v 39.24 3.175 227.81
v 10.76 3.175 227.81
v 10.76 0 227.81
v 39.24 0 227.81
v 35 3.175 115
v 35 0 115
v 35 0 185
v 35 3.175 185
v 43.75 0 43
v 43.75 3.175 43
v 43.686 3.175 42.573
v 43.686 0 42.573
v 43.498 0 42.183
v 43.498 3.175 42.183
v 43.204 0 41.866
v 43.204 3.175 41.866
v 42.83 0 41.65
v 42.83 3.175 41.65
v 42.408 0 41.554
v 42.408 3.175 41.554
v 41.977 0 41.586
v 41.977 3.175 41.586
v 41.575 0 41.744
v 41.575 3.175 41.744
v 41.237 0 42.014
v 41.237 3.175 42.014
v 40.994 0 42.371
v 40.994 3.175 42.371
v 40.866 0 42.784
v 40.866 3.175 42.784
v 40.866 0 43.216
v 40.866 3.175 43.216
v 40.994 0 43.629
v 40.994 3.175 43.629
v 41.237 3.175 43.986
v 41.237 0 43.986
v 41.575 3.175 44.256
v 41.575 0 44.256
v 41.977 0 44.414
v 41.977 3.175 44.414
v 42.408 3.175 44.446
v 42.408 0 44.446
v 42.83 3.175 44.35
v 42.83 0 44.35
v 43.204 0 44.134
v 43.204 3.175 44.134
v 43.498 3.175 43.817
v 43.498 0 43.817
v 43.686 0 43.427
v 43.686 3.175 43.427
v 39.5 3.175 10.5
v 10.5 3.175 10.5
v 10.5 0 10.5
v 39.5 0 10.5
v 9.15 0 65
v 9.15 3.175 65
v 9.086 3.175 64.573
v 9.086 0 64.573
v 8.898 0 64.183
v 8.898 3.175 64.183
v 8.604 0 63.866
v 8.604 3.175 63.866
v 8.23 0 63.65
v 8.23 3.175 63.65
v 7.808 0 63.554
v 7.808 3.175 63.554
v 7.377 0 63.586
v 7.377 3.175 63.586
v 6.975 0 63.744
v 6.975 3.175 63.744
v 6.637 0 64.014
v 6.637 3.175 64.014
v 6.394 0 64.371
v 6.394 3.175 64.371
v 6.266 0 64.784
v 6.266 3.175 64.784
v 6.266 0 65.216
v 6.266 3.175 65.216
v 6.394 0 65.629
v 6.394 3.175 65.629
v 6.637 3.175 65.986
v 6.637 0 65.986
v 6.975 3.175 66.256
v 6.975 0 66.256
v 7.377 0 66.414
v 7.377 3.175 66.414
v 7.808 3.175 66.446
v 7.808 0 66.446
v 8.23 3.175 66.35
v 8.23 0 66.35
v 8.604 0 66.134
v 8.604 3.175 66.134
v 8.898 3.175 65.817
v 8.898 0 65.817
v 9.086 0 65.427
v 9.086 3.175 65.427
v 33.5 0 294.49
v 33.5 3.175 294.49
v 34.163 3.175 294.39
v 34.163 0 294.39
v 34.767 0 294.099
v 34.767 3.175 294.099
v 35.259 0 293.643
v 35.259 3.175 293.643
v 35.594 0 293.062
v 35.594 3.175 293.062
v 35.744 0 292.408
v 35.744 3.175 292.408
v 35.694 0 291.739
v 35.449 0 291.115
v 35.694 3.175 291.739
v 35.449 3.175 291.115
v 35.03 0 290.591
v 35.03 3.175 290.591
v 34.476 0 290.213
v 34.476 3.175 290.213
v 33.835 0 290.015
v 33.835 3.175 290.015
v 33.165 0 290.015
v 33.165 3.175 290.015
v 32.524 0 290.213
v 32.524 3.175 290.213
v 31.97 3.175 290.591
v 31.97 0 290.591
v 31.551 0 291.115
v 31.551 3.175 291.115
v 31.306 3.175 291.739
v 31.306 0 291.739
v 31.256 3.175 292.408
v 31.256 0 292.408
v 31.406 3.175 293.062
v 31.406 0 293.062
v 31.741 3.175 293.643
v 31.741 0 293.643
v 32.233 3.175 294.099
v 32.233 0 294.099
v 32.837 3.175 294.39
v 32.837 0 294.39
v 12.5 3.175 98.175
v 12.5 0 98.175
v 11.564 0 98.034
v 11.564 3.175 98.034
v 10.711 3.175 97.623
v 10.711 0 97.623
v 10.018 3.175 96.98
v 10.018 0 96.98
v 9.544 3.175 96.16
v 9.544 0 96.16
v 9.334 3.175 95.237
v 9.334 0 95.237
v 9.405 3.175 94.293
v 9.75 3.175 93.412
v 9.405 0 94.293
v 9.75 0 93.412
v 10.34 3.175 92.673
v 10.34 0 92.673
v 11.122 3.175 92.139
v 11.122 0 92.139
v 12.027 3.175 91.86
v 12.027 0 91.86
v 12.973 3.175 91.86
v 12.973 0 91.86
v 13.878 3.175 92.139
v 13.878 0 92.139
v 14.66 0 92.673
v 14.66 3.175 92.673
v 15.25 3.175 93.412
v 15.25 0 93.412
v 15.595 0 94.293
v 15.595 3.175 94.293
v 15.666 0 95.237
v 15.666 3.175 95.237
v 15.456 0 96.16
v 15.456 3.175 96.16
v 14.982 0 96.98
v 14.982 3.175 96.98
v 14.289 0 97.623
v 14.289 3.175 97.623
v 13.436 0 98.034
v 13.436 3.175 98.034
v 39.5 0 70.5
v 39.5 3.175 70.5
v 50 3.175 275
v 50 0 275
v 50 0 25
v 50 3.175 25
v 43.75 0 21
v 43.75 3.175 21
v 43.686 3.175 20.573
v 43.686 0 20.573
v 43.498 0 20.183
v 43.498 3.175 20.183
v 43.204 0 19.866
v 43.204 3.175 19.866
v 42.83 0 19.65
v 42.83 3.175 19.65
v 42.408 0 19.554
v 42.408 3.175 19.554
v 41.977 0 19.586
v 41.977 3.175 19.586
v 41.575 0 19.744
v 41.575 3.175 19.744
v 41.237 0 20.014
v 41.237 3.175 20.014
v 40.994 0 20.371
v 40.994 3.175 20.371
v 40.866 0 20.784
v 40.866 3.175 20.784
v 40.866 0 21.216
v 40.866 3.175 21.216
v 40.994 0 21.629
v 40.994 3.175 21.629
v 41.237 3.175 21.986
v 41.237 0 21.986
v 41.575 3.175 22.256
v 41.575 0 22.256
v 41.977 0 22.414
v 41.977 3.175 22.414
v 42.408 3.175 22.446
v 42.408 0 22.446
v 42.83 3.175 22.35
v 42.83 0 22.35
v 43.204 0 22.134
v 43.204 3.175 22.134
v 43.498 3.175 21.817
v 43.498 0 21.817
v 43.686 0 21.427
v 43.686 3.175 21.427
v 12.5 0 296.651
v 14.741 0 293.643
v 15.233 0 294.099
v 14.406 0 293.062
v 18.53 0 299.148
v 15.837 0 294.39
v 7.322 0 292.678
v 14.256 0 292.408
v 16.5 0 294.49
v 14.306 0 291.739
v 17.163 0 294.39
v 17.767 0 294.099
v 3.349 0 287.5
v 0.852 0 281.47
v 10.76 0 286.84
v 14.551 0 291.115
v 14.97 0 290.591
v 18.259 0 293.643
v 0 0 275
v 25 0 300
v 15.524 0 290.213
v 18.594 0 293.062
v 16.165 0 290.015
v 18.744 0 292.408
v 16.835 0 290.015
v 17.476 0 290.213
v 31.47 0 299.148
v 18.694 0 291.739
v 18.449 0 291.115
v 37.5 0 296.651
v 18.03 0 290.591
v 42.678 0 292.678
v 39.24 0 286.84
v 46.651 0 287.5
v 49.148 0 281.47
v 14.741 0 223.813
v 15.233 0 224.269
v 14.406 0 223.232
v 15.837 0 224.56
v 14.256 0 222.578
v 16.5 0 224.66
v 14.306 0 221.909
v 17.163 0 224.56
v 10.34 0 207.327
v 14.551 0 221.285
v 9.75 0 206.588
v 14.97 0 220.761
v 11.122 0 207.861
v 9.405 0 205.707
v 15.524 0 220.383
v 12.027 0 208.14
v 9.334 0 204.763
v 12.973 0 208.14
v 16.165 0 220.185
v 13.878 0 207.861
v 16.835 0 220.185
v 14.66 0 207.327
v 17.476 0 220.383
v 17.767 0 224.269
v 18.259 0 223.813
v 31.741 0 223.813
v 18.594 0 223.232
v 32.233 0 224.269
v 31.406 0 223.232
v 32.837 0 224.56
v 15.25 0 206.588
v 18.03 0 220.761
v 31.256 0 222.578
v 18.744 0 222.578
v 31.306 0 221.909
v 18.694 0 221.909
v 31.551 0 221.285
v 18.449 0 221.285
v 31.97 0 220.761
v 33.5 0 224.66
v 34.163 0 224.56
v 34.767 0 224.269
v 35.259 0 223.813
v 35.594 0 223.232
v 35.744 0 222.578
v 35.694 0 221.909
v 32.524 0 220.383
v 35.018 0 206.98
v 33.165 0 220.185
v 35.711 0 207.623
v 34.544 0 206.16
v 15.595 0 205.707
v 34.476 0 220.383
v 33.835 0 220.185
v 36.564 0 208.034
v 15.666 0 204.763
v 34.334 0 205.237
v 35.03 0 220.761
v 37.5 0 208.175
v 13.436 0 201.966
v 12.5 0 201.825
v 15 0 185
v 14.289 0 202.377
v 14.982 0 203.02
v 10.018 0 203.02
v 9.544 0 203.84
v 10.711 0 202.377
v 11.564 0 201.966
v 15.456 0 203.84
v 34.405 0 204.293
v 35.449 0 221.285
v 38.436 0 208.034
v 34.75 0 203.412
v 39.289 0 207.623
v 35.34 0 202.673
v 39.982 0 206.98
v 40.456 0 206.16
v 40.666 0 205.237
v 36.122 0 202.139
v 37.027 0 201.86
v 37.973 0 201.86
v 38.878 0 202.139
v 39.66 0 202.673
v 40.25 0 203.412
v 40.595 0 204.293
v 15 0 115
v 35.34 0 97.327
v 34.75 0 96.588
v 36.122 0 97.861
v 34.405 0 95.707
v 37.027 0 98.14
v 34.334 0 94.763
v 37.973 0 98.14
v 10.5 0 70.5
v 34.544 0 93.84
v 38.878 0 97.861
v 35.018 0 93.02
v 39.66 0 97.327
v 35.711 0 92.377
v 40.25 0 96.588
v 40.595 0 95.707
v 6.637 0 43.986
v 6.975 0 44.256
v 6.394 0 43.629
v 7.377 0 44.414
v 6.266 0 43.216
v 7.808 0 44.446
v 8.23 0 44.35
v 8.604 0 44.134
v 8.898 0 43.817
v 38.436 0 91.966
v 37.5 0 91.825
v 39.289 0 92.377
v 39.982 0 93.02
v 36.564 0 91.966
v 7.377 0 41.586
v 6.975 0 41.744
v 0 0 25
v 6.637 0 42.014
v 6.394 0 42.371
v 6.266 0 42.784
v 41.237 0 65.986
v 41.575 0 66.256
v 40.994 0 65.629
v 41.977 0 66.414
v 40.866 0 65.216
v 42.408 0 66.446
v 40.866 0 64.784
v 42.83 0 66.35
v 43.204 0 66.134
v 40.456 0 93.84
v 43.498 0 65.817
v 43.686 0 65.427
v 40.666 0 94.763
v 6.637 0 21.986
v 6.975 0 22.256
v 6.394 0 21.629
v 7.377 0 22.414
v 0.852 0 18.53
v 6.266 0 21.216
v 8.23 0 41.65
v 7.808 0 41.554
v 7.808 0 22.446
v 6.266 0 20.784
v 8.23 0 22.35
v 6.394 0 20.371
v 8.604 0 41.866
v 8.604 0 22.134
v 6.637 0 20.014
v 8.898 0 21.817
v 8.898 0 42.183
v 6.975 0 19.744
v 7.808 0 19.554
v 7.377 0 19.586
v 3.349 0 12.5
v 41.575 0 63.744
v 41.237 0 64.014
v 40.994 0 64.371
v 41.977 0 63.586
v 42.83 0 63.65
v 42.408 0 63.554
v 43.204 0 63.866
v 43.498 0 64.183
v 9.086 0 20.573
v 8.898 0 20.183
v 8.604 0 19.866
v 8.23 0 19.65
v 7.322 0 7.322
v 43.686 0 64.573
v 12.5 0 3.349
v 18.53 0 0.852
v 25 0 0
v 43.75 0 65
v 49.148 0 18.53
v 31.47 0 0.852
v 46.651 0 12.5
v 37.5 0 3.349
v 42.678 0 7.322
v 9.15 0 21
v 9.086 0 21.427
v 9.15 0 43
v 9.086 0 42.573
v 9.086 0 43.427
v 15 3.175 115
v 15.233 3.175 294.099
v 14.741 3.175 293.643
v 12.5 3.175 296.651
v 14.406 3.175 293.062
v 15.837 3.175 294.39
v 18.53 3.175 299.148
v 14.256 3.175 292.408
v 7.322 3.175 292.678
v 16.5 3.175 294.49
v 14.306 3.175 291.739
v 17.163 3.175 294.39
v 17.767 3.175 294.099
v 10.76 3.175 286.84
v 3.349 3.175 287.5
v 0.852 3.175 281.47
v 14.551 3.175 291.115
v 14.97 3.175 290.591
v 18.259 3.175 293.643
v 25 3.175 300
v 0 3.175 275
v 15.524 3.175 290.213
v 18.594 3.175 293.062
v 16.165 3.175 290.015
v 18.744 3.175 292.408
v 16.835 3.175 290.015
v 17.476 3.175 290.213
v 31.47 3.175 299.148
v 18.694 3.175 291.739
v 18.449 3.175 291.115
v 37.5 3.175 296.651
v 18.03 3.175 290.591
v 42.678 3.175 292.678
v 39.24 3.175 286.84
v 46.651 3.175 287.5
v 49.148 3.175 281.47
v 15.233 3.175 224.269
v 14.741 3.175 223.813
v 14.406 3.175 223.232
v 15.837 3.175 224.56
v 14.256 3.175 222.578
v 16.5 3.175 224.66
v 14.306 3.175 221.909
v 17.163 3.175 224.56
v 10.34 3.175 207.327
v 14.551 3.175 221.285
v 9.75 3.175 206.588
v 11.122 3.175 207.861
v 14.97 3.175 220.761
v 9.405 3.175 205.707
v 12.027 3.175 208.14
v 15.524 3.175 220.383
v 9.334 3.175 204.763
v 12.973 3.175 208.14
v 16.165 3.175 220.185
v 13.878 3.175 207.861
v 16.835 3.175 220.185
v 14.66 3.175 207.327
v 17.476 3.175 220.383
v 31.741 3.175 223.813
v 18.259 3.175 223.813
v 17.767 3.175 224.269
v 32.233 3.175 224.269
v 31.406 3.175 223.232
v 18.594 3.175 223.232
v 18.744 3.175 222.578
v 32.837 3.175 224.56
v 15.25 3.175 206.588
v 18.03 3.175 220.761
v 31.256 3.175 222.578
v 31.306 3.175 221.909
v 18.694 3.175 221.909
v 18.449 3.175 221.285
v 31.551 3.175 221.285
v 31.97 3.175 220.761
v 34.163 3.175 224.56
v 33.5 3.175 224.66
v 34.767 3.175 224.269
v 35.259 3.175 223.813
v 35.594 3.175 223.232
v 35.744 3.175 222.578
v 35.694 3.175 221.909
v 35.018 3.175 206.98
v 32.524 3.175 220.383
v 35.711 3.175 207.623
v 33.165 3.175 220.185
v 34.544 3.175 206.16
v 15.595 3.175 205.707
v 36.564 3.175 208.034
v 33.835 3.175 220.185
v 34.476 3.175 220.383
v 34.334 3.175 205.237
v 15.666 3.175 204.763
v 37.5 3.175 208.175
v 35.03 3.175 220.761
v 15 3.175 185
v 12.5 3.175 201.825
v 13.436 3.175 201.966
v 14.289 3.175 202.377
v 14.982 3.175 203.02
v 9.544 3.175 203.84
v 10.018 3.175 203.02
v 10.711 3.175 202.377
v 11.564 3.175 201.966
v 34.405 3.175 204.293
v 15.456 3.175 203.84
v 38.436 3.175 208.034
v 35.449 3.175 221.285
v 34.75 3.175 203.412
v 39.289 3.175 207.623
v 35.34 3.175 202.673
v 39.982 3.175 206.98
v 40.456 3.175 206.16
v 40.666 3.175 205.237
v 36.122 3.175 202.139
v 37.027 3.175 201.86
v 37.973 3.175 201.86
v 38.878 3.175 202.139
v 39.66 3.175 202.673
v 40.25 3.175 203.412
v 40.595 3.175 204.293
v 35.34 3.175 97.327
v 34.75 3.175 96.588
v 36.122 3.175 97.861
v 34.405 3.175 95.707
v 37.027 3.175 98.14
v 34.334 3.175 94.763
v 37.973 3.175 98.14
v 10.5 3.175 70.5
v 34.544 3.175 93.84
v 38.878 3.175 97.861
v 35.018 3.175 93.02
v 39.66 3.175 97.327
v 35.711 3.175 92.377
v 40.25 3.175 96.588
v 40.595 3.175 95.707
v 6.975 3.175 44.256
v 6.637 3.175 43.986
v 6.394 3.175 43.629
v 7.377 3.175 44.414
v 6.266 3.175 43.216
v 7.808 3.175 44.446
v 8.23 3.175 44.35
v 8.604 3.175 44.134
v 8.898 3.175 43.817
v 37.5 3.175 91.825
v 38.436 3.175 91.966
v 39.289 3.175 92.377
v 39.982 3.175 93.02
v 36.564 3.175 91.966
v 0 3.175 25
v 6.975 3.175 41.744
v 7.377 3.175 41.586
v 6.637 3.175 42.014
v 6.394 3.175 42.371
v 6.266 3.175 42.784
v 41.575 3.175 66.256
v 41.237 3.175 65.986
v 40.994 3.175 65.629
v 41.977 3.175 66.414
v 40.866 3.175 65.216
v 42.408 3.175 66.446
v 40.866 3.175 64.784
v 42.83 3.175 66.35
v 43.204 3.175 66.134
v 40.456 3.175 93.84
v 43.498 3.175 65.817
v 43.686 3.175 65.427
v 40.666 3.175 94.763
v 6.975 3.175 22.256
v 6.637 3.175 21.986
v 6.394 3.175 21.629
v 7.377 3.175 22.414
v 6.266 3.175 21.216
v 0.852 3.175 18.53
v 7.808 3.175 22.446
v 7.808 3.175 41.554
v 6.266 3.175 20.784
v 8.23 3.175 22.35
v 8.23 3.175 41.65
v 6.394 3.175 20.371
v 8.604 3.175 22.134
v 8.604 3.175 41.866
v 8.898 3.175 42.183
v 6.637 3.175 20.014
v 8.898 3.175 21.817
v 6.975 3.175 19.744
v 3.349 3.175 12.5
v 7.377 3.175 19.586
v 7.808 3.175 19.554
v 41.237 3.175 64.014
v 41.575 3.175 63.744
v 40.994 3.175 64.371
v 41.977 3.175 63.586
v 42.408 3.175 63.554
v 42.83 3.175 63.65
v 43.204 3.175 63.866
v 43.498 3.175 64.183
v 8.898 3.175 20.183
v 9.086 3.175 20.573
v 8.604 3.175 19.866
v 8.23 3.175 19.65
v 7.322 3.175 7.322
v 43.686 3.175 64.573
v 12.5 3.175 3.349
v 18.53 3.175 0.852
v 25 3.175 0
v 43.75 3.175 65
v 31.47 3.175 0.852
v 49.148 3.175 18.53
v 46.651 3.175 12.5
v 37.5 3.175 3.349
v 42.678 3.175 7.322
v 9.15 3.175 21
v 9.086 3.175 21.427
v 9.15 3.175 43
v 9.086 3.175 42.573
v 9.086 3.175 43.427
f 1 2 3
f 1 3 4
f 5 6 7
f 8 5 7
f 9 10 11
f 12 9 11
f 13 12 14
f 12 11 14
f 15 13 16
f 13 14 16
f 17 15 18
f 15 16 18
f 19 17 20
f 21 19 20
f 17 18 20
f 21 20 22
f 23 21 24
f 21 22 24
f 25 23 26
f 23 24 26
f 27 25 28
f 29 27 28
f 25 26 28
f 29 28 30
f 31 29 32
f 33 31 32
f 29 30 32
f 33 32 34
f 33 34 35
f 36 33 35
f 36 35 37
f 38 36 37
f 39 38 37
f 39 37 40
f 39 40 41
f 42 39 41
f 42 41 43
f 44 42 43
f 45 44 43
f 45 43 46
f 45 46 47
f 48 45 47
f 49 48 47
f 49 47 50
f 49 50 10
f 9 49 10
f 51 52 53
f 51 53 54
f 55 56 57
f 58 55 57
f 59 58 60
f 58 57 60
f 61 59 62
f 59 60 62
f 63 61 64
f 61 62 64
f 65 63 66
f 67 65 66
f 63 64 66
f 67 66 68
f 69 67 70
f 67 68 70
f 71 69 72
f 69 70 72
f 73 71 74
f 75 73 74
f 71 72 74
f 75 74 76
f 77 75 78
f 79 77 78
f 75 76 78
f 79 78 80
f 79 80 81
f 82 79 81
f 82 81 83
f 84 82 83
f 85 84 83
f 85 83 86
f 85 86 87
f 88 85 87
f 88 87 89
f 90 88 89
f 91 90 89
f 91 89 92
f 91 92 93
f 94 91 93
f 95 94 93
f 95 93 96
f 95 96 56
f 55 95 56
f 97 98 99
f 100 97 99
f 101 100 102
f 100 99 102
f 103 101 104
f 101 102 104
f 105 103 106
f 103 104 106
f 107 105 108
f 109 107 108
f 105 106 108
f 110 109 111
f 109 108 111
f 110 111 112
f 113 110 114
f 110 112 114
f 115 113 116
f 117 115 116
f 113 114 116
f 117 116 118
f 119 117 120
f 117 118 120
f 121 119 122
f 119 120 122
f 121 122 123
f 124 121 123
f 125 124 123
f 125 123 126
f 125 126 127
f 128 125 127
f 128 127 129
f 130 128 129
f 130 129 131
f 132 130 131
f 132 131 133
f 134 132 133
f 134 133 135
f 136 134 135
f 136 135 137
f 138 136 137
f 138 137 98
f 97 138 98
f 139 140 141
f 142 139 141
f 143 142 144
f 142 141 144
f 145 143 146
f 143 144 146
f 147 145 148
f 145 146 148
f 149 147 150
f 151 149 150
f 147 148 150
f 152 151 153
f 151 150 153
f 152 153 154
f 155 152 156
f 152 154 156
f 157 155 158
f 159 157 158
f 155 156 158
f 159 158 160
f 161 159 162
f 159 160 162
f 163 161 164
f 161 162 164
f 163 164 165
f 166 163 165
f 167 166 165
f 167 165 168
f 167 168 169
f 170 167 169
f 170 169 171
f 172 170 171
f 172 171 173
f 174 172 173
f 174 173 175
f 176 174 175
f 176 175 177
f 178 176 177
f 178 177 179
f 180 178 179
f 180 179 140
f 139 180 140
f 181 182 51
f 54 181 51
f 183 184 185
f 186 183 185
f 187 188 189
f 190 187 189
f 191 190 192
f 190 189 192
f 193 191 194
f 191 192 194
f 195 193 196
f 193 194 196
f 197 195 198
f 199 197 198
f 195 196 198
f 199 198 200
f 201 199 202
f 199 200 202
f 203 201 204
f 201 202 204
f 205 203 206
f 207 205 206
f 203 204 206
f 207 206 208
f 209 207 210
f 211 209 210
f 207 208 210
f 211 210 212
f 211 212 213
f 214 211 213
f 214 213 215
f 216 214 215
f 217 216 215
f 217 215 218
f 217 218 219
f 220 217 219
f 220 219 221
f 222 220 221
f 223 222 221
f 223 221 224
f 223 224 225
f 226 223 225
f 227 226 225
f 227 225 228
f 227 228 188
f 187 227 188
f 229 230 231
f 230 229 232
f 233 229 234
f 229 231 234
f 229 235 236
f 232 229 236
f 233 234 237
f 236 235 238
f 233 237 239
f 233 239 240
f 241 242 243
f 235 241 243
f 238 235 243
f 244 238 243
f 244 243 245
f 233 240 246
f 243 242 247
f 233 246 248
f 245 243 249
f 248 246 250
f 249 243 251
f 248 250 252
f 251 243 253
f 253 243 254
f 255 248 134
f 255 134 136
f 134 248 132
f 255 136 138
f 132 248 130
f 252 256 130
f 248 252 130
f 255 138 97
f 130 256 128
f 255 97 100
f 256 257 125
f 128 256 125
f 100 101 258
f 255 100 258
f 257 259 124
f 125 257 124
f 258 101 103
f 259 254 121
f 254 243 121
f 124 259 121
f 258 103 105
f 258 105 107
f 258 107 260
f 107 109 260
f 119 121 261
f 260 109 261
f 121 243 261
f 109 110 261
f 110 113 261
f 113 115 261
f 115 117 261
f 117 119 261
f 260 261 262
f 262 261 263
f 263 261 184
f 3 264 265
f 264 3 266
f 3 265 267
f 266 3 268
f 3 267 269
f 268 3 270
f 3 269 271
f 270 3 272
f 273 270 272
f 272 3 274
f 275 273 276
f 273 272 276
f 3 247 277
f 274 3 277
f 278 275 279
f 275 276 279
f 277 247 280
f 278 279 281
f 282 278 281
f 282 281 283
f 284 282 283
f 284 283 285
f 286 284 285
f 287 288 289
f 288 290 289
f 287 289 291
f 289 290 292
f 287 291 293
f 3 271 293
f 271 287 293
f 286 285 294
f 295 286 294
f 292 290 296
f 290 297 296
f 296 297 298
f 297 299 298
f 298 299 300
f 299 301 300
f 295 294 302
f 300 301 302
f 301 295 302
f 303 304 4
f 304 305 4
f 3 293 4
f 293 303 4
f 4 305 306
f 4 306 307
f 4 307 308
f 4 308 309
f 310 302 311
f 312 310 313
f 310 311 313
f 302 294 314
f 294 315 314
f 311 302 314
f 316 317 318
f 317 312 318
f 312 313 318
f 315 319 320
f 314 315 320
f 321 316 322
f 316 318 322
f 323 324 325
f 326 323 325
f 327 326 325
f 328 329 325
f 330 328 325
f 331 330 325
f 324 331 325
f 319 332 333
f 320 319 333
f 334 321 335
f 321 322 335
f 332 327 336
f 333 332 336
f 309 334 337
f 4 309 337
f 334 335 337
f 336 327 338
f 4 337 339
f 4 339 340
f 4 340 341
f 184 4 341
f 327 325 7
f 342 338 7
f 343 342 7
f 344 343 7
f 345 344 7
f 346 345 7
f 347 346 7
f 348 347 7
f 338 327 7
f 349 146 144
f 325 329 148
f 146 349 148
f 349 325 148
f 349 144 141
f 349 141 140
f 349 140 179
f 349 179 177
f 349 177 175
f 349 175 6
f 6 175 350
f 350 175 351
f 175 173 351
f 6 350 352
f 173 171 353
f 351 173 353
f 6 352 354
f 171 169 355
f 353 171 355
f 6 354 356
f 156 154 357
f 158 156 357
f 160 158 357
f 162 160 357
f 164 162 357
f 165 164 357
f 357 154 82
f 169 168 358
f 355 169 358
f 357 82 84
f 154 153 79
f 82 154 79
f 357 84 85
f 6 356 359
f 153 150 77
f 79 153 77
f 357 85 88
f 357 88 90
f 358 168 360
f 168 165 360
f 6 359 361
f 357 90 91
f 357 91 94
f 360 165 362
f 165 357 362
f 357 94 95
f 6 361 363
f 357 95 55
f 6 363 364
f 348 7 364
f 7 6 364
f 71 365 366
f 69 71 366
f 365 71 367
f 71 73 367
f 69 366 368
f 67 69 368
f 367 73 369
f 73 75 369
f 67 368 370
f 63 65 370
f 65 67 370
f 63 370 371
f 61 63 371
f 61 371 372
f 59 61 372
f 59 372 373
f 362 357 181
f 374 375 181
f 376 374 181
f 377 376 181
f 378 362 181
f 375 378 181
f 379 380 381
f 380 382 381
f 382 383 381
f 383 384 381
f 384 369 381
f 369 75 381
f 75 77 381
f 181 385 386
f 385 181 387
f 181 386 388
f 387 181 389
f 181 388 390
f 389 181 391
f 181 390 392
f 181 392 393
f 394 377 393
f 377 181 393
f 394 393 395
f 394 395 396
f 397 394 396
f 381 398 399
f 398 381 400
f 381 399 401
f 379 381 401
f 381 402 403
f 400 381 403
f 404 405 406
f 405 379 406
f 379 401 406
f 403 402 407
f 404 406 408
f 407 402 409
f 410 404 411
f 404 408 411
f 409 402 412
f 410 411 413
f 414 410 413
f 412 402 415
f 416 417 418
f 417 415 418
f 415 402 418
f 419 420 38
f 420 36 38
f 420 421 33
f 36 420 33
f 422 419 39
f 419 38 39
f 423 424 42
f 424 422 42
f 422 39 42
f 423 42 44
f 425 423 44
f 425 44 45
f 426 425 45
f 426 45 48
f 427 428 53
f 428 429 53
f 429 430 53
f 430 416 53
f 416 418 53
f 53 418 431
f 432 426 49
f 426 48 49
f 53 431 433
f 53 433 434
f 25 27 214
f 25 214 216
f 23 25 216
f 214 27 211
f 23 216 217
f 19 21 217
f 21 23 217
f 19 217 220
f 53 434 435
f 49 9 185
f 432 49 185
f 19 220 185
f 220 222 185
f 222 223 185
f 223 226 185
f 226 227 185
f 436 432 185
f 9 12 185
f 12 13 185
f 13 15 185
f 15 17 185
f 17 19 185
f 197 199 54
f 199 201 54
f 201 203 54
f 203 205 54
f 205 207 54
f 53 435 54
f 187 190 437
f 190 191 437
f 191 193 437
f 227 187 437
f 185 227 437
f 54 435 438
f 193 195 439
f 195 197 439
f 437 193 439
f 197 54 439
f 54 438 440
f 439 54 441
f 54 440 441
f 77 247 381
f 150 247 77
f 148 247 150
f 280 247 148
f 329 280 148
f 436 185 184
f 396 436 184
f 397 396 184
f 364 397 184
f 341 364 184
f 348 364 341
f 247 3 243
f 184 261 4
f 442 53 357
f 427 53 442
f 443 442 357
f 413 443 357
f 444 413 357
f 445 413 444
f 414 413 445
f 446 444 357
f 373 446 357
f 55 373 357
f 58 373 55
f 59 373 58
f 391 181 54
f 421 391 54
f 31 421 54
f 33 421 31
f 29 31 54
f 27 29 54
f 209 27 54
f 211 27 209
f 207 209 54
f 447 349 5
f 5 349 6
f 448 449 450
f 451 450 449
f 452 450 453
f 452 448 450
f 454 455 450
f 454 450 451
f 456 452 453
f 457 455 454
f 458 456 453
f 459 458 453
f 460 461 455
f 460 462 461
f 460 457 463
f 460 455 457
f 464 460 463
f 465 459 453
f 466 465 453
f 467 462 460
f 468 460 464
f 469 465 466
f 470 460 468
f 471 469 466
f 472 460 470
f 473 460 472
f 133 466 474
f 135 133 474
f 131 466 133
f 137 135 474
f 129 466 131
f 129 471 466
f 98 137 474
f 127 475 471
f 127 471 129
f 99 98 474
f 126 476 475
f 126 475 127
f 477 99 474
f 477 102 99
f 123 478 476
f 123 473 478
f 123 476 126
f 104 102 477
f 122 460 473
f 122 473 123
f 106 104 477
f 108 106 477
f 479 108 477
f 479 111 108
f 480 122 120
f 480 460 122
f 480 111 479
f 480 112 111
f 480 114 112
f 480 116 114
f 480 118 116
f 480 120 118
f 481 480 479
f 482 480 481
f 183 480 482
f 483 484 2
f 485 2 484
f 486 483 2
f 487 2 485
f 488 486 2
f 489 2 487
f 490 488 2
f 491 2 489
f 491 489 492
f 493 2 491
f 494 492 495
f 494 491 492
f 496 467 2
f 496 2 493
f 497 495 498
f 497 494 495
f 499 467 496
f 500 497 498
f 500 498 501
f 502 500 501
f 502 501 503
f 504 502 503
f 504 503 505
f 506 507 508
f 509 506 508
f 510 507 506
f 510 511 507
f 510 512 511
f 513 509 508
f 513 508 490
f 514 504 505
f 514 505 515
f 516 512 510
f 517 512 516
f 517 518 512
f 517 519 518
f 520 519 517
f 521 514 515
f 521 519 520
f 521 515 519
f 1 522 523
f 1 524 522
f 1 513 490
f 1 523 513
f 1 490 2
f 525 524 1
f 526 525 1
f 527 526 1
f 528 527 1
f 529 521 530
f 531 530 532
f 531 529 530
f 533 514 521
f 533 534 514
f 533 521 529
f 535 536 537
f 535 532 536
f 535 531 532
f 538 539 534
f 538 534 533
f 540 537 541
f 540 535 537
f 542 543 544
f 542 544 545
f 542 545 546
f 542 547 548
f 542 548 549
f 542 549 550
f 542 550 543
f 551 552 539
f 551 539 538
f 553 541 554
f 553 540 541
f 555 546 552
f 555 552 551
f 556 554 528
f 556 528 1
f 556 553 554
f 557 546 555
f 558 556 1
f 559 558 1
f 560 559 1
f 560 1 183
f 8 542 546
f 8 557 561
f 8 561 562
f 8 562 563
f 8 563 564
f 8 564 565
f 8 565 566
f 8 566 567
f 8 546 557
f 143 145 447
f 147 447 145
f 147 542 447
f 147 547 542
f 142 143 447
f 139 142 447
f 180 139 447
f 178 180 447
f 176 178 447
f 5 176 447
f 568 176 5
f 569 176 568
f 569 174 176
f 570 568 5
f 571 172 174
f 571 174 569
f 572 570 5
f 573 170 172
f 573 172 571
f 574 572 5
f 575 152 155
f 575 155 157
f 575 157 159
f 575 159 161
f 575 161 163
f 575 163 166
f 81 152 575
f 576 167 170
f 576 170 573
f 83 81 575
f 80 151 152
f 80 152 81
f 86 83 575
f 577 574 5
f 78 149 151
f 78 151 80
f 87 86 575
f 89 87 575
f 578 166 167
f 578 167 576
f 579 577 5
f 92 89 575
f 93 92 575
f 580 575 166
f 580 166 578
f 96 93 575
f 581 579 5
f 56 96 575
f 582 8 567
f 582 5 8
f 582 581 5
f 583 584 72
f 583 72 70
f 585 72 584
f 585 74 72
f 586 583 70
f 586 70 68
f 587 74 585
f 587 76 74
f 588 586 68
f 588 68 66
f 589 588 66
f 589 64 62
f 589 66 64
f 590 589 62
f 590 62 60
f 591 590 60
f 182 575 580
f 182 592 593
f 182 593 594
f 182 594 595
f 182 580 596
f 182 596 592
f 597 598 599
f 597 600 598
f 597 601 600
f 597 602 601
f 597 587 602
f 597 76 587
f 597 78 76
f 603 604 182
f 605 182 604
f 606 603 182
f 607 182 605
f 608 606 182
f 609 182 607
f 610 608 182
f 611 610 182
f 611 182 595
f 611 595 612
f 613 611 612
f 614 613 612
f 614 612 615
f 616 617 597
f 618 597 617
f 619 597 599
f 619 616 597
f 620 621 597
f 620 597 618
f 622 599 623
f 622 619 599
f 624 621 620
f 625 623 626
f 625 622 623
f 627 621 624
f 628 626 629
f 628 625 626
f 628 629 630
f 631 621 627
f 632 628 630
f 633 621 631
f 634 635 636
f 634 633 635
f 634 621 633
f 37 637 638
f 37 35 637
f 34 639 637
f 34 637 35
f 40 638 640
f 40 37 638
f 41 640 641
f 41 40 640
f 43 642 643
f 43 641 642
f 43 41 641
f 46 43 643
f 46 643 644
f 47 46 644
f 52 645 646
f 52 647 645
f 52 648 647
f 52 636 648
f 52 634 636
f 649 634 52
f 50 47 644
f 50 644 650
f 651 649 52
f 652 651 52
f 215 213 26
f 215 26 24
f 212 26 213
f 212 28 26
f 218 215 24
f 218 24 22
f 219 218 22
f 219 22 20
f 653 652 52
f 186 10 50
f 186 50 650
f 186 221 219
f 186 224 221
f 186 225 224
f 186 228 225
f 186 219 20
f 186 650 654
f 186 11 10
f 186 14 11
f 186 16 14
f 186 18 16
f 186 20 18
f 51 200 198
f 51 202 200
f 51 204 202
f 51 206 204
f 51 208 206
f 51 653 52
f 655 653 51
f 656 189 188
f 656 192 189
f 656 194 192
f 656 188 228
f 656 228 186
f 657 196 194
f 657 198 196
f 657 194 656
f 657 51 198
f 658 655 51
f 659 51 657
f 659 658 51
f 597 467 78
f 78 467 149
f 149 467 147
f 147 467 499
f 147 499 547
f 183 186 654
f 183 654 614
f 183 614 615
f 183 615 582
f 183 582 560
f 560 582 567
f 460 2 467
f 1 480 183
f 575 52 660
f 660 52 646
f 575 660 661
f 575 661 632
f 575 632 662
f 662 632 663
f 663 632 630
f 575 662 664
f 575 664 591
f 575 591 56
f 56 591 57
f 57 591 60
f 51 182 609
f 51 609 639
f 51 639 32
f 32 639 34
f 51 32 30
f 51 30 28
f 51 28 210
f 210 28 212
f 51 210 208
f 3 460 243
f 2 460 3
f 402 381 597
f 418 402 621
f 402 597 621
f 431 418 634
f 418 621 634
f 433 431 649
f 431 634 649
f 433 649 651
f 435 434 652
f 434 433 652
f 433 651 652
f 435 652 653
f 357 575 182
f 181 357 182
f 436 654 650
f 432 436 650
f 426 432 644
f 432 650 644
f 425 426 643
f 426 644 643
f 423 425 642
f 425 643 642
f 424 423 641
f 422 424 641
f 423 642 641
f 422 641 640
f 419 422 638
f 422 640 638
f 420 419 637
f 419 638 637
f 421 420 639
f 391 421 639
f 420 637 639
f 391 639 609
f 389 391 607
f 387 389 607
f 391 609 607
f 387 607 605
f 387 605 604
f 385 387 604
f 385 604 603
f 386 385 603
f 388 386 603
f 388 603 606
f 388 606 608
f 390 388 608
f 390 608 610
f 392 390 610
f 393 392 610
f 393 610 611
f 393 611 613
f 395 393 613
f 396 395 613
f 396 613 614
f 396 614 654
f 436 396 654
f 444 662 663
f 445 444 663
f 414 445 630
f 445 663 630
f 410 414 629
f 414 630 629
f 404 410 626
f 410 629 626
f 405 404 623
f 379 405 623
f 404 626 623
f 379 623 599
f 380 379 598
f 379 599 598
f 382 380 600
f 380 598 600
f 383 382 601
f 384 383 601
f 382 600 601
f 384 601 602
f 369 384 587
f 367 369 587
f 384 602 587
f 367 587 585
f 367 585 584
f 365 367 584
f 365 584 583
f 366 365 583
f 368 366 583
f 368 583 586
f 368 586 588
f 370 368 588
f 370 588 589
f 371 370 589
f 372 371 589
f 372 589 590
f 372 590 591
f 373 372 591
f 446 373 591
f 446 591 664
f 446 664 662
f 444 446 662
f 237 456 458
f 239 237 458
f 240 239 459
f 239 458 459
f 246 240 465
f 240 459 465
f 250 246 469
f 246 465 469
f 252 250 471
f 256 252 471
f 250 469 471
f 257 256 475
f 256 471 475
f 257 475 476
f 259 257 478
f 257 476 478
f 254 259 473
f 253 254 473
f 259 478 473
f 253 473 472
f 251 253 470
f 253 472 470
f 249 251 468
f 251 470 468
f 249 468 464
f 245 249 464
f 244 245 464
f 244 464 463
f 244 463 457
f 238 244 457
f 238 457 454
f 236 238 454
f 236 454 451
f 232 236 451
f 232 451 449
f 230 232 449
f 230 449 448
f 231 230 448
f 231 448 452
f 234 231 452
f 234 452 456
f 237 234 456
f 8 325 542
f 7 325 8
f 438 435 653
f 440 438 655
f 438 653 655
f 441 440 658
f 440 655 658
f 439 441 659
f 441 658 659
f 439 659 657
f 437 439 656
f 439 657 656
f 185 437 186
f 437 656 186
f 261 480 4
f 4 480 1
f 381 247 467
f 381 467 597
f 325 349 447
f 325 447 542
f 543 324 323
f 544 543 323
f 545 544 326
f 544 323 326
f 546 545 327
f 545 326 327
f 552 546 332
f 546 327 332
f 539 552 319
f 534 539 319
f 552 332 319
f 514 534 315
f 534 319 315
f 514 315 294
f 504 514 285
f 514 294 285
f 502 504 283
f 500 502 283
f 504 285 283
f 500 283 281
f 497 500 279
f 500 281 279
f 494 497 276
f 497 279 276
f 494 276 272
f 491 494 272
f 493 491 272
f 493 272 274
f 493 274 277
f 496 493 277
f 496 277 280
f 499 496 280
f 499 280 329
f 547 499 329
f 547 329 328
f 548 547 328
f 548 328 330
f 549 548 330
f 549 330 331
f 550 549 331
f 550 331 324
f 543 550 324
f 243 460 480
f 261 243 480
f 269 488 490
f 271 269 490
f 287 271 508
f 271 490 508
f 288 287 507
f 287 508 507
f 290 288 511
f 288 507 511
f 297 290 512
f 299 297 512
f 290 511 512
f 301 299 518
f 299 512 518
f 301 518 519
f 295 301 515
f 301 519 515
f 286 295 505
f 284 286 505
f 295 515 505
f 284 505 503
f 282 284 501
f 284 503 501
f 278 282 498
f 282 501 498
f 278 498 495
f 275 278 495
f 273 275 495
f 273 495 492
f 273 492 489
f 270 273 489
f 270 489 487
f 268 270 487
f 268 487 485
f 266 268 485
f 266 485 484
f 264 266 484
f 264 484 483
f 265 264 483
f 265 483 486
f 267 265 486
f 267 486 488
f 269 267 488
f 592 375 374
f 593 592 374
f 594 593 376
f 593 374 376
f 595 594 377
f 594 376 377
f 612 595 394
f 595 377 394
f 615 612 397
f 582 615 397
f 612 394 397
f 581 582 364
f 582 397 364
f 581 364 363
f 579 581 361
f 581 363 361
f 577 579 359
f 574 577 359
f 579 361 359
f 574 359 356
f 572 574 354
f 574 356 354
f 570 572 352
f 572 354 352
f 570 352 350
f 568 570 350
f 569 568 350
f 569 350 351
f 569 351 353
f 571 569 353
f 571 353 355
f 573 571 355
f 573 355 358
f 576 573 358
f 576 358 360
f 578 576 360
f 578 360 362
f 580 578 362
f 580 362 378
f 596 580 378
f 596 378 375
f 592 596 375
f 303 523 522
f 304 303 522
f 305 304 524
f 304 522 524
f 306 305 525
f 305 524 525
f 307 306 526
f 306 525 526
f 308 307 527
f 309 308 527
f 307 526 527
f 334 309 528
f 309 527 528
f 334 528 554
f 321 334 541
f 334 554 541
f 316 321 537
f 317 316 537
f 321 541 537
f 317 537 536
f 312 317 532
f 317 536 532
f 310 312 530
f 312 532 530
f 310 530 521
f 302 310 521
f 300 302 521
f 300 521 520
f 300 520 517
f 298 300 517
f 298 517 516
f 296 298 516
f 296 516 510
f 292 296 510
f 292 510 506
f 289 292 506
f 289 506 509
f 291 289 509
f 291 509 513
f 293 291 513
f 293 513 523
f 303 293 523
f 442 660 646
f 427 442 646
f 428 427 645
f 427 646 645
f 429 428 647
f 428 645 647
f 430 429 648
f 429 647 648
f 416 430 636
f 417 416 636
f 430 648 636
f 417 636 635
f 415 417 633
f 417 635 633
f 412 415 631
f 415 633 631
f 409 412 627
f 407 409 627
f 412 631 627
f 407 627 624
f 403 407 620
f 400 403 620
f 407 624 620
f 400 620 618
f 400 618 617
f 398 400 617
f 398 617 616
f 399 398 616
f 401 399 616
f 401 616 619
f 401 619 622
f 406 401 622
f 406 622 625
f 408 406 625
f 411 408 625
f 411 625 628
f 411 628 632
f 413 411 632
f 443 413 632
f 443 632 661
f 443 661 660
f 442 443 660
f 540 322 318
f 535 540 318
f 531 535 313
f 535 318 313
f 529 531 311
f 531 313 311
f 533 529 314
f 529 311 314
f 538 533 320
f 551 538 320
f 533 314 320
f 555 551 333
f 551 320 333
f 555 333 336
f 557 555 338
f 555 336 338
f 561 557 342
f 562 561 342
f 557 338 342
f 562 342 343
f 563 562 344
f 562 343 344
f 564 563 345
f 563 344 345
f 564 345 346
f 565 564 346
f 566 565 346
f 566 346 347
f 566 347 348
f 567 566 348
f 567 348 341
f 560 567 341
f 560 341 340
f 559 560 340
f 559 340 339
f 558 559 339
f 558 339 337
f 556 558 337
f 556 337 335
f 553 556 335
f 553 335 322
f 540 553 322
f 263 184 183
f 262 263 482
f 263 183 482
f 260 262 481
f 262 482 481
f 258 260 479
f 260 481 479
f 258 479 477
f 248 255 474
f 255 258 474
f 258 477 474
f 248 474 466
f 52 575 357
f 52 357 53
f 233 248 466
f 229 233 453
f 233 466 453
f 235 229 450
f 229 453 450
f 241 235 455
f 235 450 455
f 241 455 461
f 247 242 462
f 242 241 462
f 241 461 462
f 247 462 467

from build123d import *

# Parameters (mm, degrees)
SKETCH2_W              = 50
SKETCH2_H              = 300
BOSS_EXTRUDE1_DEPTH    = 3.175
SKETCH3_R              = 1.025
SKETCH3_R_2            = 2.25
SKETCH3_W              = 29
SKETCH3_H              = 60
SKETCH3_W_2            = 28.48
SKETCH3_H_2            = 59.03
CUT_EXTRUDE1_DEPTH     = 6.35
CUT_EXTRUDE2_DEPTH     = 6.35
SKETCH5_R              = 3.175
SKETCH5_W              = 20
SKETCH5_H              = 70
CUT_EXTRUDE3_DEPTH     = 6.35
M2_5_CLEARANCE_HOLE1_D = 2.9


with BuildPart() as part:
    # Sketch2 → Boss-Extrude1 (new body)
    with BuildSketch(Plane(origin=(0, 0, 0), x_dir=(1, 0, 0), z_dir=(0, 1, 0))):
        with Locations((25, -150)):
            Rectangle(SKETCH2_W, SKETCH2_H)
    extrude(amount=BOSS_EXTRUDE1_DEPTH)

    # Sketch3 → Cut-Extrude1 (cut)
    with BuildSketch(Plane(origin=(0, 3.175, 0), x_dir=(1, 0, 0), z_dir=(0, 1, 0))):
        with Locations(Location((7.7, -21, 0), (0, 0, 270))):
            Circle(SKETCH3_R)
        with Locations(Location((7.7, -43, 0), (0, 0, 270))):
            Circle(SKETCH3_R)
        with Locations(Location((7.7, -65, 0), (0, 0, 270))):
            Circle(SKETCH3_R)
        with Locations(Location((42.3, -65, 0), (0, 0, 270))):
            Circle(SKETCH3_R)
        with Locations(Location((42.3, -43, 0), (0, 0, 270))):
            Circle(SKETCH3_R)
        with Locations(Location((42.3, -21, 0), (0, 0, 270))):
            Circle(SKETCH3_R)
        with Locations(Location((16.5, -292.24, 0), (0, 0, 270))):
            Circle(SKETCH3_R_2)
        with Locations(Location((33.5, -292.24, 0), (0, 0, 270))):
            Circle(SKETCH3_R_2)
        with Locations(Location((16.5, -222.41, 0), (0, 0, 270))):
            Circle(SKETCH3_R_2)
        with Locations(Location((33.5, -222.41, 0), (0, 0, 270))):
            Circle(SKETCH3_R_2)
        with Locations((25, -40.5)):
            Rectangle(SKETCH3_W, SKETCH3_H)
        with Locations((25, -257.325)):
            Rectangle(SKETCH3_W_2, SKETCH3_H_2)
    extrude(amount=-CUT_EXTRUDE1_DEPTH, mode=Mode.SUBTRACT)

    # Sketch4 → Cut-Extrude2 (cut)
    with BuildSketch(Plane(origin=(0, 3.175, 0), x_dir=(1, 0, 0), z_dir=(0, 1, 0))):
        with BuildLine():
            Line((0, 0), (0, -25))
            ThreePointArc((0, -25), (7.32233047, -7.32233047), (25, 0))
            Line((25, 0), (0, 0))
        make_face()
        with BuildLine():
            ThreePointArc((25, 0), (42.67766953, -7.32233047), (50, -25))
            Line((50, -25), (50, 0))
            Line((50, 0), (25, 0))
        make_face()
        with BuildLine():
            ThreePointArc((25, -300), (7.32233047, -292.67766953), (0, -275))
            Line((0, -275), (0, -300))
            Line((0, -300), (25, -300))
        make_face()
        with BuildLine():
            Line((50, -300), (50, -275))
            ThreePointArc((50, -275), (42.67766953, -292.67766953), (25, -300))
            Line((25, -300), (50, -300))
        make_face()
    extrude(amount=-CUT_EXTRUDE2_DEPTH, mode=Mode.SUBTRACT)

    # Sketch5 → Cut-Extrude3 (cut)
    with BuildSketch(Plane.XZ):
        with Locations(Location((12.5, 205, 0), (0, 0, 270))):
            Circle(SKETCH5_R)
        with Locations(Location((12.5, 95, 0), (0, 0, 90))):
            Circle(SKETCH5_R)
        with Locations(Location((37.5, 95, 0), (0, 0, 270))):
            Circle(SKETCH5_R)
        with Locations(Location((37.5, 205, 0), (0, 0, 90))):
            Circle(SKETCH5_R)
        with Locations((25, 150)):
            Rectangle(SKETCH5_W, SKETCH5_H)
    extrude(amount=-CUT_EXTRUDE3_DEPTH, mode=Mode.SUBTRACT)

    # M2.5 Clearance Hole1 (through all)
    with Locations(Plane(origin=(0, 0, 0), x_dir=(-1, 0, 0), z_dir=(0, -1, 0))):
        with Locations((-7.7, -65), (-42.3, -65), (-7.7, -43), (-42.3, -43), (-42.3, -21), (-7.7, -21)):
            Hole(M2_5_CLEARANCE_HOLE1_D / 2)


solid = part.part
